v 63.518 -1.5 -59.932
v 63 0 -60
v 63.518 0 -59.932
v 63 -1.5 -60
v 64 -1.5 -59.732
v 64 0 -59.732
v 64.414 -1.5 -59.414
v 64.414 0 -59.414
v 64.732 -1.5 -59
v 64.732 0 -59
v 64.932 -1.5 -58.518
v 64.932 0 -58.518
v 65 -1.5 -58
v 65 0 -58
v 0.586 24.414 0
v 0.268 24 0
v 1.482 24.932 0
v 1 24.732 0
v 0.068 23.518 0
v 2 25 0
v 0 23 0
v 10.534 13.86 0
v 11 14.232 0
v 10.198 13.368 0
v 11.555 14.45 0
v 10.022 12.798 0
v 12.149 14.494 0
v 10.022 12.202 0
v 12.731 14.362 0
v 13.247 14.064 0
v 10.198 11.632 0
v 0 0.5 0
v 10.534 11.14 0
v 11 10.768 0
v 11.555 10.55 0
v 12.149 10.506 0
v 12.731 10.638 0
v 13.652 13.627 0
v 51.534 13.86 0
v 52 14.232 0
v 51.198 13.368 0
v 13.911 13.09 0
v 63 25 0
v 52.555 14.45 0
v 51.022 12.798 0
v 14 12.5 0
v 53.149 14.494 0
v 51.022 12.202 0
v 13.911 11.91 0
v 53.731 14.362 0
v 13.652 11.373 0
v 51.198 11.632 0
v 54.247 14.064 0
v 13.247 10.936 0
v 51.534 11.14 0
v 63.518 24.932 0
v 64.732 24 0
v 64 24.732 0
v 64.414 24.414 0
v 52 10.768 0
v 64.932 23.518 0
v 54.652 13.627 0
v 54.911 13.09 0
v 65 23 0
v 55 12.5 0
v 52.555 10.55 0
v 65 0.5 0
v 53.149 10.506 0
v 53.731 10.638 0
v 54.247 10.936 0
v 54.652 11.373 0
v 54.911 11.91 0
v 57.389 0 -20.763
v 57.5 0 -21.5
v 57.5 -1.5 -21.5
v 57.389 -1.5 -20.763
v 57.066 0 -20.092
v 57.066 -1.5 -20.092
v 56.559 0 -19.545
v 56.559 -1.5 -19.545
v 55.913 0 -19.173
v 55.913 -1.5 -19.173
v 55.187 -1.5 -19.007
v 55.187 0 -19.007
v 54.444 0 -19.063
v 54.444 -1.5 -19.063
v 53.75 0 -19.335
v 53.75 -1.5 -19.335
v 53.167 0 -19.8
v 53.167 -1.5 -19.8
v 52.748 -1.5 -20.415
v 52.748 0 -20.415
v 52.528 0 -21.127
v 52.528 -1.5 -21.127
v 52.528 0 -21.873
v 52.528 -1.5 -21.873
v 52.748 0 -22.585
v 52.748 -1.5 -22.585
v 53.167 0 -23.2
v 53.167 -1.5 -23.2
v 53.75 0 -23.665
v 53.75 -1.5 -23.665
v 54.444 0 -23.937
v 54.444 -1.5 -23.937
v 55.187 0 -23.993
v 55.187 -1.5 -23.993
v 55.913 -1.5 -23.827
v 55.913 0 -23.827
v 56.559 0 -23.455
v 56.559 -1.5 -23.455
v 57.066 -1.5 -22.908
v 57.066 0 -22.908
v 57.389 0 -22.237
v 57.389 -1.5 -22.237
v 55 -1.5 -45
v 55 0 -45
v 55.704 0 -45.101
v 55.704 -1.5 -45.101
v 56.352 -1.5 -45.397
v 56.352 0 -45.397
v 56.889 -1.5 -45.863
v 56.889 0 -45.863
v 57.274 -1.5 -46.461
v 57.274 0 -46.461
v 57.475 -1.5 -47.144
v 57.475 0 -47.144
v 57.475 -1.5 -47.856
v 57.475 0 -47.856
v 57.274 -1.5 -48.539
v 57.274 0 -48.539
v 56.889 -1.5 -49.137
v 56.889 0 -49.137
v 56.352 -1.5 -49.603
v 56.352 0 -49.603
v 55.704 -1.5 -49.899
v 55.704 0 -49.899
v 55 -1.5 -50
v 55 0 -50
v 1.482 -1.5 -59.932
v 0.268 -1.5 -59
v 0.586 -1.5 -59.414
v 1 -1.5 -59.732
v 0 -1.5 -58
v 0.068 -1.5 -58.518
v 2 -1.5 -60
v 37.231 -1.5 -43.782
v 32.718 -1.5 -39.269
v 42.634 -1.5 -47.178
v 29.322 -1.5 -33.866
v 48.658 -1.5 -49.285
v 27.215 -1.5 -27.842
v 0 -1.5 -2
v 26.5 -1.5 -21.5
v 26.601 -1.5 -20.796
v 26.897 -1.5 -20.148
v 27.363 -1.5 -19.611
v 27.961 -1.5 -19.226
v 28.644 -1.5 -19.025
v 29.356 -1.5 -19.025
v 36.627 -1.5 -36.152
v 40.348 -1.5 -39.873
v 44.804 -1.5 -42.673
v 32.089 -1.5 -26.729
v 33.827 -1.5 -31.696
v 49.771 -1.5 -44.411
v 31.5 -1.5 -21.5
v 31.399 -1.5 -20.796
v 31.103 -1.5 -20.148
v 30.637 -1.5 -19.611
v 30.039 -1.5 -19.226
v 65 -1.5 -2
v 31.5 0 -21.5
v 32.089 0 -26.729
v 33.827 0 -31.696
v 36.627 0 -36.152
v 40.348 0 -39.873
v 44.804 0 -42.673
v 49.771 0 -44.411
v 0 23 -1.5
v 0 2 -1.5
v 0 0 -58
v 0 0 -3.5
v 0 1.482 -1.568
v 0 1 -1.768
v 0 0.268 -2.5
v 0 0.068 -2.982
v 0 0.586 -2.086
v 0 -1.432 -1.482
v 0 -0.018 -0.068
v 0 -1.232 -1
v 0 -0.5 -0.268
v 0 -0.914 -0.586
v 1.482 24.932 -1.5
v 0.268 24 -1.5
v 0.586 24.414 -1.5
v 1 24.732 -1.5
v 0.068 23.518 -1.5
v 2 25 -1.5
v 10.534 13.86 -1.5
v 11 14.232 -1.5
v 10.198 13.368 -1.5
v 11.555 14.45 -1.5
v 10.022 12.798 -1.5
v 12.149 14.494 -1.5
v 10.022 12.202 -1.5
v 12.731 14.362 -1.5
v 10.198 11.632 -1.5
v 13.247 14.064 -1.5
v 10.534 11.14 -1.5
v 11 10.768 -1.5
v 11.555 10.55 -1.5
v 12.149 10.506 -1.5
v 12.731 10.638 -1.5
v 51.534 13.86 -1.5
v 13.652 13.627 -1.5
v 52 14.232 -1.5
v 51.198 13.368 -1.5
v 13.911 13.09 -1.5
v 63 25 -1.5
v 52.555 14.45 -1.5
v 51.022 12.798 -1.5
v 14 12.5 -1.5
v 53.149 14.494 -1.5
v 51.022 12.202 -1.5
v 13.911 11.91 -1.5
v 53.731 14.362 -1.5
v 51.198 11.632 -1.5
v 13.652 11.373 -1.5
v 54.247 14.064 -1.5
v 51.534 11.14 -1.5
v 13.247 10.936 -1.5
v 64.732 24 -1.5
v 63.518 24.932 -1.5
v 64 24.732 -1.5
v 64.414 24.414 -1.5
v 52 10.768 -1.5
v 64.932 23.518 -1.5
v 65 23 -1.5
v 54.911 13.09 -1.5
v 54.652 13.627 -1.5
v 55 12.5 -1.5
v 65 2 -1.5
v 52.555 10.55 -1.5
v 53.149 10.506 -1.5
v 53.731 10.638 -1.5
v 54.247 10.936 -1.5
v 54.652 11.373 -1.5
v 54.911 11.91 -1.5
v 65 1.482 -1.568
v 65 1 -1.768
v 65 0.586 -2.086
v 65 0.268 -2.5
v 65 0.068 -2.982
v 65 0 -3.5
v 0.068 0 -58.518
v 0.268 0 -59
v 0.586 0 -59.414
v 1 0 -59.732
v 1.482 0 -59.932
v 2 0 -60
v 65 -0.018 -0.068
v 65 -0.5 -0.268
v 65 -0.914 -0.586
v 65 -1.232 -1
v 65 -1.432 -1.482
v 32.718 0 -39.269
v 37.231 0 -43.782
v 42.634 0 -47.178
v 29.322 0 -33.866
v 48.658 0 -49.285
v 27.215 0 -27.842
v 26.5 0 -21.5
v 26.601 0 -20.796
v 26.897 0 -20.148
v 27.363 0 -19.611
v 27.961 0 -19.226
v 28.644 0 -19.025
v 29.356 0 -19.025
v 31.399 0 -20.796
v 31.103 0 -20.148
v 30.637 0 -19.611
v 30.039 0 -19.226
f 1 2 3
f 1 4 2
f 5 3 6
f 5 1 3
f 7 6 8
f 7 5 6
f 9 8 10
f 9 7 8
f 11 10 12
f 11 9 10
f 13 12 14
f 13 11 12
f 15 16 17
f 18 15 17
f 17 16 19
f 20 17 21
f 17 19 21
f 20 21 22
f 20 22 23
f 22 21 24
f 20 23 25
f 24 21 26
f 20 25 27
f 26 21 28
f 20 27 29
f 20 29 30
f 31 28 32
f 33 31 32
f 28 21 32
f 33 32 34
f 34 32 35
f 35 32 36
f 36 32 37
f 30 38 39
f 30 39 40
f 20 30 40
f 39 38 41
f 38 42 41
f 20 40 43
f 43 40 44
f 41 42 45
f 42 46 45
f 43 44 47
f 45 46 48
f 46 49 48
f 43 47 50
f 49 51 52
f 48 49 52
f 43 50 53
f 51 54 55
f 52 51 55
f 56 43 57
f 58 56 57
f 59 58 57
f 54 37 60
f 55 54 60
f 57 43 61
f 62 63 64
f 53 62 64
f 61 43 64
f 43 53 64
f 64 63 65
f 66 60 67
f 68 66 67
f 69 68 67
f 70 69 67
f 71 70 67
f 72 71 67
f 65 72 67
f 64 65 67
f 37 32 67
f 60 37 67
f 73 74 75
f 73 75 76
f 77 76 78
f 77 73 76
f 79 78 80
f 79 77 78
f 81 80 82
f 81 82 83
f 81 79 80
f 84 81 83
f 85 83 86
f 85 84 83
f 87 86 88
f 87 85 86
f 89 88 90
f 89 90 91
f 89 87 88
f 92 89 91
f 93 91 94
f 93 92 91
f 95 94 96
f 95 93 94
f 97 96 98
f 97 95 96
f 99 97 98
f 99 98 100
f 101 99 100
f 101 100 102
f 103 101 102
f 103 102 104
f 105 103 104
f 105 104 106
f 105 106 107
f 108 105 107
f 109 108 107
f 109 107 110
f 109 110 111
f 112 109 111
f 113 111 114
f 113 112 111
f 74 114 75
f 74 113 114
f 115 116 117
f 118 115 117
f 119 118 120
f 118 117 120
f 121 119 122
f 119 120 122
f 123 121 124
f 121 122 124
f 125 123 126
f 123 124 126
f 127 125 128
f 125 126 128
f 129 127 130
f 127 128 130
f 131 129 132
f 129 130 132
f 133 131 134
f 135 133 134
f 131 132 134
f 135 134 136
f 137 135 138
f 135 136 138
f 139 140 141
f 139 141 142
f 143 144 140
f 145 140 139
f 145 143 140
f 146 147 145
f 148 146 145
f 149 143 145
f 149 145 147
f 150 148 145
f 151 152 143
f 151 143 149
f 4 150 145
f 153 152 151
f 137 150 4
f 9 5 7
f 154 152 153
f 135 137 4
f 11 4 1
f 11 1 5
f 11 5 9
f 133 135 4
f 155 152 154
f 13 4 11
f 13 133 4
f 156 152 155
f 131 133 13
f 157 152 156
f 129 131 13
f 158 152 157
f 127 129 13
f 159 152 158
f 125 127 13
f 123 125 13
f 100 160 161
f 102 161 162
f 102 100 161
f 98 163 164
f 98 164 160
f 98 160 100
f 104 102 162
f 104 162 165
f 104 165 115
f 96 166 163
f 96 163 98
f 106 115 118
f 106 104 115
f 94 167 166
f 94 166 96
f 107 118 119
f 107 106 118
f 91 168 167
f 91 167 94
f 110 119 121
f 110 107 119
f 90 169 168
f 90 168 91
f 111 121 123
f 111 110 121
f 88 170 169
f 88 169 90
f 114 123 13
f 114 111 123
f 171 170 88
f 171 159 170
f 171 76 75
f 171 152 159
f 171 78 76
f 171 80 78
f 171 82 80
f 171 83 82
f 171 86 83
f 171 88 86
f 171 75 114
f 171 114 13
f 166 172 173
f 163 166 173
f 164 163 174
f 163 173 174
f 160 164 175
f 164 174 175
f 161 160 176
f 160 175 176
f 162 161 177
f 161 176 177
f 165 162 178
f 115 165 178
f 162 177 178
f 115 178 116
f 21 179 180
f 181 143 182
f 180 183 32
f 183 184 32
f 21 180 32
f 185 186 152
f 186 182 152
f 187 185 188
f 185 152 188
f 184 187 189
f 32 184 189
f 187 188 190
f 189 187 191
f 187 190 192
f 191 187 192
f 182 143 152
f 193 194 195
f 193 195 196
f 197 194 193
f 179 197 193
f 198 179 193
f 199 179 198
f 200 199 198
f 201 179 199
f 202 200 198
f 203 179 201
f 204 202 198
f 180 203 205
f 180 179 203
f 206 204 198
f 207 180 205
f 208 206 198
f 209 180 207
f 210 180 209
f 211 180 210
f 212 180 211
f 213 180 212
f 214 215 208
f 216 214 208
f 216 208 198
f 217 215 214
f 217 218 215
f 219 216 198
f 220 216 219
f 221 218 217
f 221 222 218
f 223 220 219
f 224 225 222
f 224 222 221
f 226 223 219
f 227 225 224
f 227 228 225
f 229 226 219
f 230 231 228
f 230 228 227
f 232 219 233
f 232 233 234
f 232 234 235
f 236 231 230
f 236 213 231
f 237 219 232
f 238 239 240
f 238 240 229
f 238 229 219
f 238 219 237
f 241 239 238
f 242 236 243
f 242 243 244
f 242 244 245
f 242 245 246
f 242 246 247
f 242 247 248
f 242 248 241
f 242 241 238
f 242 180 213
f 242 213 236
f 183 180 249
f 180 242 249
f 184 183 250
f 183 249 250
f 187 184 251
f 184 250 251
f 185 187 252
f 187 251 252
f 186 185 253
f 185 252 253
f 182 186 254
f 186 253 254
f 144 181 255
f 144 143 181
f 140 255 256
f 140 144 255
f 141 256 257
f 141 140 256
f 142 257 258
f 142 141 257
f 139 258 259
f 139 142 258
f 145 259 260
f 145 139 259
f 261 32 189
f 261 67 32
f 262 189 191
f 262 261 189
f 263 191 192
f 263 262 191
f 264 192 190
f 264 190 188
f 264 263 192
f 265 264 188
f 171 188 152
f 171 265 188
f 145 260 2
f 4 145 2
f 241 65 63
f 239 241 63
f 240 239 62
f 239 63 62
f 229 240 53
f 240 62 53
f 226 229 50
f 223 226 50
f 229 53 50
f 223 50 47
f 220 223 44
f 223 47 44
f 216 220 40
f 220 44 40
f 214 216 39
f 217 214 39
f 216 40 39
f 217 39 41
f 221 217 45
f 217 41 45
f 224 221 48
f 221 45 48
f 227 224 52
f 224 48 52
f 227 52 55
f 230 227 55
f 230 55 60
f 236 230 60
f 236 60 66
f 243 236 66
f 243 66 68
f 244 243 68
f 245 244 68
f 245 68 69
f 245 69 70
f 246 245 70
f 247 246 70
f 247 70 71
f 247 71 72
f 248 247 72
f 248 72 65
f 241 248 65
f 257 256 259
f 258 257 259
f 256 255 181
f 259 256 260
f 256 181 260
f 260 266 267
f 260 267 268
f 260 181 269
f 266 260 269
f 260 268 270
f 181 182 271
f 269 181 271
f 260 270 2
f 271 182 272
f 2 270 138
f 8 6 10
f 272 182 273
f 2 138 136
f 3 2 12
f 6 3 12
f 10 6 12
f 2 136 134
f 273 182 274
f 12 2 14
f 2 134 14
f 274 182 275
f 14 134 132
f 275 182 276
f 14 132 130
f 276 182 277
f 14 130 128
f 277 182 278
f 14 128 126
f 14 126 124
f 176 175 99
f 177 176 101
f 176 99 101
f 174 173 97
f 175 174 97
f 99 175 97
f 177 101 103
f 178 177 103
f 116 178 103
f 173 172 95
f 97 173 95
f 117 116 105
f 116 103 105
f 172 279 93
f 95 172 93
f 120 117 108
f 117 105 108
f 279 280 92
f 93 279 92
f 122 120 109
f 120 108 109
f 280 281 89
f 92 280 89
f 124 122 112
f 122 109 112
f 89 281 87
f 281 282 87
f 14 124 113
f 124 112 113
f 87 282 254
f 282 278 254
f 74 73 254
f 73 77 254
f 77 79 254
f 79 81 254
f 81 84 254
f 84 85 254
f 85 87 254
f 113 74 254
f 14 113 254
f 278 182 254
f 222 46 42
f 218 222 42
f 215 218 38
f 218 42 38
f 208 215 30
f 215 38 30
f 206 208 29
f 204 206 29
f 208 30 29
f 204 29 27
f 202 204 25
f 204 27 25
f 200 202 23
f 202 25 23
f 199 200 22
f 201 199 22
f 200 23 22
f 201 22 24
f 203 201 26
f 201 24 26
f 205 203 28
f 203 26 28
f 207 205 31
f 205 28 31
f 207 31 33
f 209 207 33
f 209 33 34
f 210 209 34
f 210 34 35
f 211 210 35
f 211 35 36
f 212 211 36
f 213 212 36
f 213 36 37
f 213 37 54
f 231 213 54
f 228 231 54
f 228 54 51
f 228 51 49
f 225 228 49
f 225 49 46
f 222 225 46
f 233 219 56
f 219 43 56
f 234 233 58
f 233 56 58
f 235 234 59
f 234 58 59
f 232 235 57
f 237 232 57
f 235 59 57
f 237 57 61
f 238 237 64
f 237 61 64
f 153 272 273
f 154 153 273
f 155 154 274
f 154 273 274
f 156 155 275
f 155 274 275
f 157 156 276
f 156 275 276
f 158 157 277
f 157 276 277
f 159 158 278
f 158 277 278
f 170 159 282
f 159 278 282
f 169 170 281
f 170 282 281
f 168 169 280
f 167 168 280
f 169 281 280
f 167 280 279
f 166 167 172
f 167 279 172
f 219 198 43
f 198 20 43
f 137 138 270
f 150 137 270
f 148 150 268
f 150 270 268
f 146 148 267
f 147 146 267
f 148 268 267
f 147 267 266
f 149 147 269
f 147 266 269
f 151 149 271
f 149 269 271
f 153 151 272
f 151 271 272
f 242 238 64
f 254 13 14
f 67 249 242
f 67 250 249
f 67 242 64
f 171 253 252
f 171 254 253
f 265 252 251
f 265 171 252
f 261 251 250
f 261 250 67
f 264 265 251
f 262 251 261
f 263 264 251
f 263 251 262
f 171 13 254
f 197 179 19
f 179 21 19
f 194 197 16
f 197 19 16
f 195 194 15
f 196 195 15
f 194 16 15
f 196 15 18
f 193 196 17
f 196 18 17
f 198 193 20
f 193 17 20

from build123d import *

# Parameters (mm, degrees)
F1_W     = 65
F1_H     = 60
F1_R     = 2.5
F2_DEPTH = 1.5
F3_W     = 65
F3_H     = 1.5
F4_DEPTH = 25
F5_R     = 2
F6_DEPTH = 25
F7_R     = 2


with BuildPart() as f2:
    # F1 (on face) → F2 (new body)
    with BuildSketch(Plane.XZ):
        with Locations((32.5, -30)):
            Rectangle(F1_W, F1_H)
        with BuildLine():
            ThreePointArc((55, -45), (57.5, -47.5), (55, -50))
            ThreePointArc((55, -50), (34.847457, -41.652543), (26.5, -21.5))
            ThreePointArc((26.5, -21.5), (29, -19), (31.5, -21.5))
            ThreePointArc((31.5, -21.5), (38.382991, -38.117009), (55, -45))
        make_face(mode=Mode.SUBTRACT)
        with Locations((55, -21.5)):
            Circle(F1_R, mode=Mode.SUBTRACT)
    extrude(amount=F2_DEPTH)

    # F3 (on Front) → F4 (join)
    with BuildSketch(Plane.XZ):
        with Locations((32.5, -0.75)):
            Rectangle(F3_W, F3_H)
    extrude(amount=-F4_DEPTH)

    # F5 (on face) → F6 (cut)
    with BuildSketch(Plane.XY):
        with Locations((53, 12.5)):
            Circle(F5_R)
        with Locations((12, 12.5)):
            Circle(F5_R)
    extrude(amount=-F6_DEPTH, mode=Mode.SUBTRACT)

    # F7
    f7_edges = [f2.edges().sort_by_distance(p)[0] for p in [
        (65, -0.75, -60),
        (32.5, 0, -1.5),
        (32.5, -1.5, 0),
        (0, -0.75, -60),
        (0, 25, -0.75),
        (65, 25, -0.75),
    ]]
    fillet(f7_edges, radius=F7_R)


solid = f2.part
